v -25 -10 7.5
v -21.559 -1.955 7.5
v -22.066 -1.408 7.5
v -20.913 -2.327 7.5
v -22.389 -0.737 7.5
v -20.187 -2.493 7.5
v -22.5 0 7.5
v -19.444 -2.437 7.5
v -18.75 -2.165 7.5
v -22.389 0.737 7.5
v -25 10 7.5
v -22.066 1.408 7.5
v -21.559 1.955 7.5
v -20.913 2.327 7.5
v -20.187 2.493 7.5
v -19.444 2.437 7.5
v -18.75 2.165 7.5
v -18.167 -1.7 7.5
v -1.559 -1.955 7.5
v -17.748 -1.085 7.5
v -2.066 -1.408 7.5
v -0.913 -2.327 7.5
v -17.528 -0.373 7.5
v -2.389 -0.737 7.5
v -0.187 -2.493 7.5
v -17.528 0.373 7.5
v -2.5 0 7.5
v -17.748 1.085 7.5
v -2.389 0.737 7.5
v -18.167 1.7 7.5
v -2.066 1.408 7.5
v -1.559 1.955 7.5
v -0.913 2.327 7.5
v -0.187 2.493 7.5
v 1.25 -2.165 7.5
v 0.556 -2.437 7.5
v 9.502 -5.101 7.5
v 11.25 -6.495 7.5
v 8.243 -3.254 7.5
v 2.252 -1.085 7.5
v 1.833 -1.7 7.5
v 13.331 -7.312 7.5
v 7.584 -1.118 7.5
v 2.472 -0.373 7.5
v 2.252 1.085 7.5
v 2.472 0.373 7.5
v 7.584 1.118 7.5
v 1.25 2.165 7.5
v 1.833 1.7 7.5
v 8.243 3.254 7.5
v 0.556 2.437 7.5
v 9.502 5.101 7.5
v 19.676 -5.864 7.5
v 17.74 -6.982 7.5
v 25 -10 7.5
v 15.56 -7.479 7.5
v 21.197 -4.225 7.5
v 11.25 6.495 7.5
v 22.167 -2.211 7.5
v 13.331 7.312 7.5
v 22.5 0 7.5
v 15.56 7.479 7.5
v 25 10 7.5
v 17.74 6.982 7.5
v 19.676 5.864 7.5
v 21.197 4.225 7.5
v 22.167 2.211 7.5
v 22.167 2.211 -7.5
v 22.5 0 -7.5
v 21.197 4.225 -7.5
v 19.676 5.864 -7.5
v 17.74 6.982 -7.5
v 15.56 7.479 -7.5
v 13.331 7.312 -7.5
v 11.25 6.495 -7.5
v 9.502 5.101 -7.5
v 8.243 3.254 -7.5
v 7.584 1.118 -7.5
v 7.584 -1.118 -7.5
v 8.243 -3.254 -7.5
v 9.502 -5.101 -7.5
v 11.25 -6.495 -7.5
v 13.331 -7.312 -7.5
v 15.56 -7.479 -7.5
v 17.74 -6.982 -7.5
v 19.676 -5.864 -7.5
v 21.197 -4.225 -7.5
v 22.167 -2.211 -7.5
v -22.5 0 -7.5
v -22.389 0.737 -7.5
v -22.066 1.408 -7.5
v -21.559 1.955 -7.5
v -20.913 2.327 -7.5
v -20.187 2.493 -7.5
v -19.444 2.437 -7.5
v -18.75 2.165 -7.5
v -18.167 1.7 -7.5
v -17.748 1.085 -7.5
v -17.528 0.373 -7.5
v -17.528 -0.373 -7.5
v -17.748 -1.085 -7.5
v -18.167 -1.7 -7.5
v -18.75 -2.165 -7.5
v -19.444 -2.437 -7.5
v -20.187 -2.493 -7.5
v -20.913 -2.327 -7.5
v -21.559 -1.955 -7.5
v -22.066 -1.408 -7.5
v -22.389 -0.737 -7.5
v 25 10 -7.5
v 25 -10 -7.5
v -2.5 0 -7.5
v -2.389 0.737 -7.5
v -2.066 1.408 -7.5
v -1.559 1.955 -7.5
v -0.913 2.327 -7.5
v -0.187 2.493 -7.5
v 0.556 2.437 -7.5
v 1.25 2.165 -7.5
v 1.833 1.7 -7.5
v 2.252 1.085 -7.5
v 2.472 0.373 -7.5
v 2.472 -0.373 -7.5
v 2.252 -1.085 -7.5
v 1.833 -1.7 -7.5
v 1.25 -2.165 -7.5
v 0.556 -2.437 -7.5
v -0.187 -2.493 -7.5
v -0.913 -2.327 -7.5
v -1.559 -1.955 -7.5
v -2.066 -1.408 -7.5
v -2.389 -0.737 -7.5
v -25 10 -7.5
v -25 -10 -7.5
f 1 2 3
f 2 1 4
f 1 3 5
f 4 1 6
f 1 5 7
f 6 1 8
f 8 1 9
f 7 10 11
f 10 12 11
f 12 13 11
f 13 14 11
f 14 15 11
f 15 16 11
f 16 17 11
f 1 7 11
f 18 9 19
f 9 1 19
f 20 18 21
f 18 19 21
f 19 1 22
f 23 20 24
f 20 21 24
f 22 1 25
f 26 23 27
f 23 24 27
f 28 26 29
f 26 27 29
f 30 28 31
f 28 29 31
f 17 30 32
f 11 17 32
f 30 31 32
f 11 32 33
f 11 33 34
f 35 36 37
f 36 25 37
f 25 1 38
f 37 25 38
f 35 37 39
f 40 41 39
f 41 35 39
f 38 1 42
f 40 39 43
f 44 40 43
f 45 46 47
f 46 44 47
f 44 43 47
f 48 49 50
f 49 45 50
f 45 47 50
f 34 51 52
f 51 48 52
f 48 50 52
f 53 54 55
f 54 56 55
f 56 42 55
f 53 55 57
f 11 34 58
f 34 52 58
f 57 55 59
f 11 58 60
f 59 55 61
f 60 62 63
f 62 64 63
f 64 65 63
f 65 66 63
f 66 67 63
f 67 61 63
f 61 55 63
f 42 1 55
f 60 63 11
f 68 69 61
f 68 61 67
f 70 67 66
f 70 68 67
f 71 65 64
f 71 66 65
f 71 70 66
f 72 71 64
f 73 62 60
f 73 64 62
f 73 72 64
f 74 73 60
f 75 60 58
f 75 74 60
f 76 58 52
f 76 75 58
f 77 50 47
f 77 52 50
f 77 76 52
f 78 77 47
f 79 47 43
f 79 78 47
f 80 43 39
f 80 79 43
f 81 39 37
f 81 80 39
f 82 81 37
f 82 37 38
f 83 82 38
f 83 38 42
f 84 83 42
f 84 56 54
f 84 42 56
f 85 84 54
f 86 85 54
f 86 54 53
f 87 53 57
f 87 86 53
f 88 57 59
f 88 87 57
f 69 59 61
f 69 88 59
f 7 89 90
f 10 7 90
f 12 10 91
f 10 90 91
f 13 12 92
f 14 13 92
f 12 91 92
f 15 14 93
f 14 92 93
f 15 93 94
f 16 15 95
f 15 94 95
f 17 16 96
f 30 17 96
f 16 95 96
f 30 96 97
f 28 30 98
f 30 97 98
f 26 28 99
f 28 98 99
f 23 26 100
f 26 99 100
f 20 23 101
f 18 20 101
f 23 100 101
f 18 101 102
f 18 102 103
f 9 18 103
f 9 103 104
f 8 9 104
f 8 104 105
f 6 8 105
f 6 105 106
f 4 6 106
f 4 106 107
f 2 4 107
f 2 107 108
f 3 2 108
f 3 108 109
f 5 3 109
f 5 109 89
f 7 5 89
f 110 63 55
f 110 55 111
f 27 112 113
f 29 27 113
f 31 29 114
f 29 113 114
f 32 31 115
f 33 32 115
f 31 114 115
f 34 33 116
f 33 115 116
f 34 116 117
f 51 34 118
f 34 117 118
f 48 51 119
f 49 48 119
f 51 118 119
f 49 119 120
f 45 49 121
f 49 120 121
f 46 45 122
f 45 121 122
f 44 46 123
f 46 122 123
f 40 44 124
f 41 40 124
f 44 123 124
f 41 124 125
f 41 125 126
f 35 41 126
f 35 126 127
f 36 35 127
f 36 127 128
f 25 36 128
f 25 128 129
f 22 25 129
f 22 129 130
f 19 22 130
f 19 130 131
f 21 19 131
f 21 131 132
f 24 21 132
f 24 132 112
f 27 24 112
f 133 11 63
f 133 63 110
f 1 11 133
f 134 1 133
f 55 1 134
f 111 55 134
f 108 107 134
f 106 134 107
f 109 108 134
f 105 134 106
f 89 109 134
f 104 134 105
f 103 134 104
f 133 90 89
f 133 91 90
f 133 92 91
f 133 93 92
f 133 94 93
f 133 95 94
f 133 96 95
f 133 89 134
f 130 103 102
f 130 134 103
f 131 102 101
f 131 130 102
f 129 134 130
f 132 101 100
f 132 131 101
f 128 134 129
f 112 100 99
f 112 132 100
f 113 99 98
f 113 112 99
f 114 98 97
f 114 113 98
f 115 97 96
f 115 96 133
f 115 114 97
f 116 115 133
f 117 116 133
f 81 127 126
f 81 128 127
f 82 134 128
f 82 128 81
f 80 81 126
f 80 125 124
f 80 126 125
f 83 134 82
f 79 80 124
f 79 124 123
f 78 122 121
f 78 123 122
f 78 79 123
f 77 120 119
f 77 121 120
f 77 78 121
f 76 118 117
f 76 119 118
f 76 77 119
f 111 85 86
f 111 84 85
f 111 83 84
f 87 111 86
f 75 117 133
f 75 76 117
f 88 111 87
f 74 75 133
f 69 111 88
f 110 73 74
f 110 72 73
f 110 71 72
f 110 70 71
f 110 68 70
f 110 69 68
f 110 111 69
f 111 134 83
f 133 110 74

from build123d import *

# Parameters (mm, degrees)
SKETCH1_W               = 15
SKETCH1_H               = 20
BOSS_EXTRUDE1_DEPTH     = 25
CUT_EXTRUDE1_DEPTH      = 31.822070015
CUT_EXTRUDE1_DEPTH_BACK = 31.822070015
SKETCH2_R               = 7.5
M6_TAPPED_HOLE1_D       = 5


with BuildPart() as part:
    # Sketch1 → Boss-Extrude1 (new, symmetric)
    with BuildSketch(Plane(origin=(0, 0, 0), x_dir=(0, 0, -1), z_dir=(1, 0, 0))):
        Rectangle(SKETCH1_W, SKETCH1_H)
    extrude(amount=BOSS_EXTRUDE1_DEPTH, both=True)

    # Sketch2 → Cut-Extrude1 (cut, two sides: drawn at the far end of the back side and taken through both)
    with BuildSketch(Plane.XY.offset(7.5).offset(-CUT_EXTRUDE1_DEPTH_BACK)):
        with Locations((15, 0)):
            Circle(SKETCH2_R)
    extrude(amount=CUT_EXTRUDE1_DEPTH + CUT_EXTRUDE1_DEPTH_BACK, mode=Mode.SUBTRACT)

    # M6 Tapped Hole1 (through all)
    with Locations(Plane.XY.offset(7.5)):
        with Locations((0, 0), (-20, 0)):
            Hole(M6_TAPPED_HOLE1_D / 2)


solid = part.part
